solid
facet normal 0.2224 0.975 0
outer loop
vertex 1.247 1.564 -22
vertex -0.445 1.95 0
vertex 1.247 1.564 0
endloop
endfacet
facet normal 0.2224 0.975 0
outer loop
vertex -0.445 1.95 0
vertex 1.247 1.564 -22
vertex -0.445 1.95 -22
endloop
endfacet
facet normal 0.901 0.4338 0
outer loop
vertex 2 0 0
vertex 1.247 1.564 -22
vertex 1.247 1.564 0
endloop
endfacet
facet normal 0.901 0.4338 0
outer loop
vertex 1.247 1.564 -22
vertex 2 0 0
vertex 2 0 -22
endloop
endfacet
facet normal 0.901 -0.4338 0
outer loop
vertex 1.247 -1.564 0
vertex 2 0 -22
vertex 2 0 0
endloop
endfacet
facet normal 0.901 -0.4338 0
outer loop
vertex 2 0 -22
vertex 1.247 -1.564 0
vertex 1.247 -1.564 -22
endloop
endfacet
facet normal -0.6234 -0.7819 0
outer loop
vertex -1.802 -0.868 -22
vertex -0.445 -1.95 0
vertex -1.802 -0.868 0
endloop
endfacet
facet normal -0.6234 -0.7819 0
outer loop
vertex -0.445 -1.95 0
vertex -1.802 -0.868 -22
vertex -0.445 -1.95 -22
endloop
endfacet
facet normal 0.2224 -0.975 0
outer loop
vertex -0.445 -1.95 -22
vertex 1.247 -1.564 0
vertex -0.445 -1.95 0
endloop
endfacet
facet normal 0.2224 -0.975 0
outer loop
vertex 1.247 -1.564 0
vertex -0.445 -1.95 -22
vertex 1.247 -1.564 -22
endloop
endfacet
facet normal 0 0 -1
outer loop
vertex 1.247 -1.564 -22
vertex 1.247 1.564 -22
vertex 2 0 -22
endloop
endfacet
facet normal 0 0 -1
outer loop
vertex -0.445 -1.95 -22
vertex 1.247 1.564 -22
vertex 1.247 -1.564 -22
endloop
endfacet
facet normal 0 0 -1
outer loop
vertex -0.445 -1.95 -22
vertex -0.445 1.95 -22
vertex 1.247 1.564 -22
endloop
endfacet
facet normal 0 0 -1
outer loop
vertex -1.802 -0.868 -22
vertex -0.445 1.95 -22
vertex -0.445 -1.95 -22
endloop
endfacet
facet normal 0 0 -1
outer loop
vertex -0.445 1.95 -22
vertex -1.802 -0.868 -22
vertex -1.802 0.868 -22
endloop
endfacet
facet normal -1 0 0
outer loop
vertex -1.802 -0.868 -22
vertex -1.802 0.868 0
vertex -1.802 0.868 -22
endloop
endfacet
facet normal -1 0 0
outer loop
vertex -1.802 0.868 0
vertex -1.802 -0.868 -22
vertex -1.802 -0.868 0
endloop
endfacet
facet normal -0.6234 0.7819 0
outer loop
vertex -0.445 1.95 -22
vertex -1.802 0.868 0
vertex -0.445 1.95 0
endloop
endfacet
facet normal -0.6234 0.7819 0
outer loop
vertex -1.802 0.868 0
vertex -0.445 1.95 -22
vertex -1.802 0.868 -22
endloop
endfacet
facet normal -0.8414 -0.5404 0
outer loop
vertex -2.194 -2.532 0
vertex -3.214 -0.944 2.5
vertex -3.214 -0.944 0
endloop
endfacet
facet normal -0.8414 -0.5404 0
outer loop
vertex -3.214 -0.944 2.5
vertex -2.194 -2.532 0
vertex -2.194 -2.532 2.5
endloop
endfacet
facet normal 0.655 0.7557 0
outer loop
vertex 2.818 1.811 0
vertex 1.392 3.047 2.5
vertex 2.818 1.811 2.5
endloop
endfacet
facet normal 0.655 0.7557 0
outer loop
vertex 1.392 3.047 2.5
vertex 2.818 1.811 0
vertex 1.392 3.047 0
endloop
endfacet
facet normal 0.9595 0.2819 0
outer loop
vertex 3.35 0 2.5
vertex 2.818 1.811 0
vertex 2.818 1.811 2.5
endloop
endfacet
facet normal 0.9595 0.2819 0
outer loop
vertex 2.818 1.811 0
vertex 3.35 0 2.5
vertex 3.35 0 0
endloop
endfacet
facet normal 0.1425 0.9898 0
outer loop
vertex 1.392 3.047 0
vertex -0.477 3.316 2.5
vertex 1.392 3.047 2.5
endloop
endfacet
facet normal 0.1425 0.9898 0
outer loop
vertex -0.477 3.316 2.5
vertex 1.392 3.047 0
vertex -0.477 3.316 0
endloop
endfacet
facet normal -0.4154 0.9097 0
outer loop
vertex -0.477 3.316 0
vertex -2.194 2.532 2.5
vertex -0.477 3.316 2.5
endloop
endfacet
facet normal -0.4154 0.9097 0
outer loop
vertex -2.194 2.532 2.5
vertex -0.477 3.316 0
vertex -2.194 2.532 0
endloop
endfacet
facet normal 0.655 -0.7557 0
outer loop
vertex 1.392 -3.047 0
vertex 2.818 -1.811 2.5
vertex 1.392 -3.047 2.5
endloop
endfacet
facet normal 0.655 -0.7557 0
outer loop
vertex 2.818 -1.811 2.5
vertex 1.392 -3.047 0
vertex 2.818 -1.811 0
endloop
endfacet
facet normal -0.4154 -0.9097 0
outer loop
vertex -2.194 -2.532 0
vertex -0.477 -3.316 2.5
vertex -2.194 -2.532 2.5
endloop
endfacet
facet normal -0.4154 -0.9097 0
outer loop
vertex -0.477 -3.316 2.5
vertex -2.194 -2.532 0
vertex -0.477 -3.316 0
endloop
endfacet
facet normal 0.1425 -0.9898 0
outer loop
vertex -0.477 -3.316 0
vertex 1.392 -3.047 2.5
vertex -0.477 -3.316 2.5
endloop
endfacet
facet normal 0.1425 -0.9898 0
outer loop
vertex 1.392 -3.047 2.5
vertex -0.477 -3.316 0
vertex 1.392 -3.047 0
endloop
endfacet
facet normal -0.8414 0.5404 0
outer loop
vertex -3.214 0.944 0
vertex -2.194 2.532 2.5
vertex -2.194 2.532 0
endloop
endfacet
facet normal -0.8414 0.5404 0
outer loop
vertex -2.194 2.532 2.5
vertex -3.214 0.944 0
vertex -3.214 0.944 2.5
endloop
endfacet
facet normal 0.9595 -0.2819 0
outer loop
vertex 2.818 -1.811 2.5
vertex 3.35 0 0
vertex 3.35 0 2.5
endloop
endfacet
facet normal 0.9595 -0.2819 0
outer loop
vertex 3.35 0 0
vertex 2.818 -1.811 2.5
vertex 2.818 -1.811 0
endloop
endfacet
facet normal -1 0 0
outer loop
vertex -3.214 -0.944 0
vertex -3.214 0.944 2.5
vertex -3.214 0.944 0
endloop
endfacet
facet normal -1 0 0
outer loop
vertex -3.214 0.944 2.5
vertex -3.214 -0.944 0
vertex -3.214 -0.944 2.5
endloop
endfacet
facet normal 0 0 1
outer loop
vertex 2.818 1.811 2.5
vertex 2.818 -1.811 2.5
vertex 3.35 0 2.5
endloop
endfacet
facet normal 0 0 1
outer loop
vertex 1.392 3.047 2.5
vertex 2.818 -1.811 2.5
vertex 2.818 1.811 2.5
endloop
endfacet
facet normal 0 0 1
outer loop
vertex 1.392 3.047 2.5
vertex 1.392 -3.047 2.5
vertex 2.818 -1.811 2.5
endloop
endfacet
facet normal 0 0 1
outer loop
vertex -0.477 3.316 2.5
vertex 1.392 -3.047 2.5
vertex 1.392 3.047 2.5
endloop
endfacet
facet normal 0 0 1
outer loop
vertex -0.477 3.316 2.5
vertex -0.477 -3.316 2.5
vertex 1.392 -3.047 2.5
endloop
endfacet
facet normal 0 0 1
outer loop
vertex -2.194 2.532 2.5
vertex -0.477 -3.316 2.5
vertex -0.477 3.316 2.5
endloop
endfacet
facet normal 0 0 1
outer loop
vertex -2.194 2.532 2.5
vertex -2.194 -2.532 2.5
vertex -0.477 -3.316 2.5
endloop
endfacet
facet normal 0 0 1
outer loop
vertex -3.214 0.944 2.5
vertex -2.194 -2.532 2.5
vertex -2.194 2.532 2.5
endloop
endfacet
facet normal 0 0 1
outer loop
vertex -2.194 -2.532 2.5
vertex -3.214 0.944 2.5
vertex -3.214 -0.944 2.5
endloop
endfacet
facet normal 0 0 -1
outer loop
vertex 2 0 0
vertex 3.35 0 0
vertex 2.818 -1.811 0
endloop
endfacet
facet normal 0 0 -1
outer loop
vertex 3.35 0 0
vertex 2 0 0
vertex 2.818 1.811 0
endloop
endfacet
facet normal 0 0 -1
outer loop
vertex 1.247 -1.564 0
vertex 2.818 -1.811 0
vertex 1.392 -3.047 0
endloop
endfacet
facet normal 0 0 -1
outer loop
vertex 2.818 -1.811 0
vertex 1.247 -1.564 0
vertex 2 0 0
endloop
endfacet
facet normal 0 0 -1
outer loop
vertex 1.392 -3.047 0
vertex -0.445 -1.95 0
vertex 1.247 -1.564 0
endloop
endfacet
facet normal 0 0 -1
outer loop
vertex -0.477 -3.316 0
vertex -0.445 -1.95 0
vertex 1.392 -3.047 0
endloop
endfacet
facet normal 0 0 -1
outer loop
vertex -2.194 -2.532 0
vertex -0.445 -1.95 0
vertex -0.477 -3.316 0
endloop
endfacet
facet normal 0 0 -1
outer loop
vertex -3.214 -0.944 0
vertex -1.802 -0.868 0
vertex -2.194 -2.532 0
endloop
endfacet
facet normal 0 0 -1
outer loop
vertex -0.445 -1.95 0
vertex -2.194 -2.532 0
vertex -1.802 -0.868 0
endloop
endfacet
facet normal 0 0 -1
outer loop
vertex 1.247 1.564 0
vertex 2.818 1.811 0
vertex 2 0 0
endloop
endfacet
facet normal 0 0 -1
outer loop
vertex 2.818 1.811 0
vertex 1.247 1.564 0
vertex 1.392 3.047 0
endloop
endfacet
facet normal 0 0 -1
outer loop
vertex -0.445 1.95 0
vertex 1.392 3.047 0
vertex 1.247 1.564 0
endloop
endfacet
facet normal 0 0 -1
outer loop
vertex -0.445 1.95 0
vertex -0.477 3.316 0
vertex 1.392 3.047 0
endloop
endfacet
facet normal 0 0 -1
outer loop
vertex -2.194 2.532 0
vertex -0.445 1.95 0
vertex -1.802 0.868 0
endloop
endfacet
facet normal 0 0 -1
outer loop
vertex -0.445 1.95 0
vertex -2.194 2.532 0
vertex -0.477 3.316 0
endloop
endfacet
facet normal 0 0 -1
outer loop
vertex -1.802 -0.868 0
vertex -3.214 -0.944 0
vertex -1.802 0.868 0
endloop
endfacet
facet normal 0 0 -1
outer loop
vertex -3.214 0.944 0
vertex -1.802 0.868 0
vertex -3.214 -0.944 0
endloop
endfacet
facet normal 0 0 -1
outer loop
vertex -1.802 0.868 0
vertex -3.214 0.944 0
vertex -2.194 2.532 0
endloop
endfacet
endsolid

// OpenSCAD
function ScrewDiameter()= 3.6;  
function ScrewLength()= 22;
function ScrewHeadDiameter()= 6.7;
function ScrewHeadHeight()= 2.5;

//err on the side of smaller tolerances for screws

module screw(3dPrinterTolerance=.4)
{
	union()
	{
		translate([0,0,-ScrewLength()])
		{
			cylinder(ScrewLength()+3dPrinterTolerance, (ScrewDiameter()+3dPrinterTolerance)/2, (ScrewDiameter()+3dPrinterTolerance)/2);
		}
		cylinder(ScrewHeadHeight(), ScrewHeadDiameter()/2,ScrewHeadDiameter()/2);
	}
}

screw();
